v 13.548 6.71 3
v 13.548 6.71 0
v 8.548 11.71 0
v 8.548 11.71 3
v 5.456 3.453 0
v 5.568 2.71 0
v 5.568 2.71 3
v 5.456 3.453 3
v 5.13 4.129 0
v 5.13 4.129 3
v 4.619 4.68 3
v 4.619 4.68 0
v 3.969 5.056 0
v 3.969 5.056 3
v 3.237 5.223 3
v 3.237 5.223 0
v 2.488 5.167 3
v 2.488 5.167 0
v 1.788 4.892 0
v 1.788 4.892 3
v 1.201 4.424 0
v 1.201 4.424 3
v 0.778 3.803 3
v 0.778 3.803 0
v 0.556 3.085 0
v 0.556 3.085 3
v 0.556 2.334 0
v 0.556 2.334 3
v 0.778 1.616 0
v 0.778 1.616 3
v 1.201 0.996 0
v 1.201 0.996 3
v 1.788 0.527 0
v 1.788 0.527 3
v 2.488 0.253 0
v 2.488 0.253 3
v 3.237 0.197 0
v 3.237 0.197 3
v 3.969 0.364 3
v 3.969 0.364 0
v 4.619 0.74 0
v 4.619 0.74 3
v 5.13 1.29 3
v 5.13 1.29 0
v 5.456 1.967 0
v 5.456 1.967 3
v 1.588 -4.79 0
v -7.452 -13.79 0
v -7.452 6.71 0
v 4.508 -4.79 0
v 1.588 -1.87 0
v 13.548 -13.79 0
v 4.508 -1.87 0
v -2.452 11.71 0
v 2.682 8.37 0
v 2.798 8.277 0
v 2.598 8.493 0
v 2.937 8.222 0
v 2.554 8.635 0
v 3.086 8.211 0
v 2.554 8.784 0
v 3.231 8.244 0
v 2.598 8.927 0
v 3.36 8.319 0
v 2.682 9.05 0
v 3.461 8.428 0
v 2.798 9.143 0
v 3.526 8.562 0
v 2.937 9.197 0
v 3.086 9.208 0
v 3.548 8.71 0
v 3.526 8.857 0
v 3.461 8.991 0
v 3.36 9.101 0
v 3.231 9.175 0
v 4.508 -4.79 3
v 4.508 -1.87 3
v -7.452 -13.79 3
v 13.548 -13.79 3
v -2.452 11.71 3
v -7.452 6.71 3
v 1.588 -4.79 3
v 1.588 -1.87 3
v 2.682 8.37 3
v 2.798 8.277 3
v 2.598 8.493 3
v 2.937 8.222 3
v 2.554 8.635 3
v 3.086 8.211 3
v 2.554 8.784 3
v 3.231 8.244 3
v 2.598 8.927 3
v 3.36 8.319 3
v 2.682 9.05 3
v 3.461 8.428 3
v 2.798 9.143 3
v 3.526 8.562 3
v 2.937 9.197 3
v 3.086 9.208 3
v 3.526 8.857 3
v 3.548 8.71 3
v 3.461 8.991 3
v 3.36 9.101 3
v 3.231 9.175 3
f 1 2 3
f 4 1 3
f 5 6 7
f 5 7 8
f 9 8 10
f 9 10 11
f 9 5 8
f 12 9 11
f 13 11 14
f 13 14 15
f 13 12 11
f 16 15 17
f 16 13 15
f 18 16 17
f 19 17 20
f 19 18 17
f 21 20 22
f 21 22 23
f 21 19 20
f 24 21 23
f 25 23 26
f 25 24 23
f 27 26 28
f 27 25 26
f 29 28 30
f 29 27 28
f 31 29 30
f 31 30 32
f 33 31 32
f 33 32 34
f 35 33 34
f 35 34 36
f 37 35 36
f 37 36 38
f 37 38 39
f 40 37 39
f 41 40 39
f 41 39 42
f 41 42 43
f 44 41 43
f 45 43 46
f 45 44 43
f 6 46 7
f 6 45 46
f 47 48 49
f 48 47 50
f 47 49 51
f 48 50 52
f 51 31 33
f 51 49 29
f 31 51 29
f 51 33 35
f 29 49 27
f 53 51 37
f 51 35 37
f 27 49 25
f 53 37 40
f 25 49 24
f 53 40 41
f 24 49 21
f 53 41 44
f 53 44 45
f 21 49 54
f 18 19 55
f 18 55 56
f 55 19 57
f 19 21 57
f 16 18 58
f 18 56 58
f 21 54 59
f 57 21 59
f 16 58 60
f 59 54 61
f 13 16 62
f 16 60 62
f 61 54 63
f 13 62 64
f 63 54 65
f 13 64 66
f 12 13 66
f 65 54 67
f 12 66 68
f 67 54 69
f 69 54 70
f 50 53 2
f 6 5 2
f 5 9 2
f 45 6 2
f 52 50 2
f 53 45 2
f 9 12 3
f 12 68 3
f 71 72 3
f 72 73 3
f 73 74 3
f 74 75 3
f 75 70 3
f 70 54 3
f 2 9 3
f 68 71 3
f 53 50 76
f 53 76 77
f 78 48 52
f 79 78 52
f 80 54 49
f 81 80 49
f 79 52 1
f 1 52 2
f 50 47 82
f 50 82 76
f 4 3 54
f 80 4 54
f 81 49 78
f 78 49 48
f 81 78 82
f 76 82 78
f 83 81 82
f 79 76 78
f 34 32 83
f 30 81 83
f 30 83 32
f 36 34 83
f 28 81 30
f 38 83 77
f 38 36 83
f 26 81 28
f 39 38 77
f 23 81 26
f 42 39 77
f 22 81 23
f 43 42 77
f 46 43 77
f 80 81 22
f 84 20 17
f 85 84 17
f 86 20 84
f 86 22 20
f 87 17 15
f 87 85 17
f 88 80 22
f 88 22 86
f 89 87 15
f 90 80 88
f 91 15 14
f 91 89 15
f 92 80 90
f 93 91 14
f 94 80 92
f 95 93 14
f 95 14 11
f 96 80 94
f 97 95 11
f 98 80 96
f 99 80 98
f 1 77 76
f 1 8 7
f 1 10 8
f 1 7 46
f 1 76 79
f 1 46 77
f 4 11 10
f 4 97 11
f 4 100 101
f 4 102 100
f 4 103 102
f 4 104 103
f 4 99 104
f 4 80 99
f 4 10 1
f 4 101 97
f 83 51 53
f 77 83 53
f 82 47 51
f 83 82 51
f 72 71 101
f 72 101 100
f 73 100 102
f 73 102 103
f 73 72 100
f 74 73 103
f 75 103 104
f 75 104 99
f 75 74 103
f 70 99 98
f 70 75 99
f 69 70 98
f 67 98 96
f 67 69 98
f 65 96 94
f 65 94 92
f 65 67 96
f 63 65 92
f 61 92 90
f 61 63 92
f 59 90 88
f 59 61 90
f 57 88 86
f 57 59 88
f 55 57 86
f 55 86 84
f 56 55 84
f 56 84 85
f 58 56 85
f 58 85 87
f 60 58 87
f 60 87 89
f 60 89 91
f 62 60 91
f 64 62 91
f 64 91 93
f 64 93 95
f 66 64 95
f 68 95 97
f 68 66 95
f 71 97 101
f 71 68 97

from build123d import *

# Parameters (mm, degrees)
SKETCH1_W           = 2.92
SKETCH1_H           = 2.92
SKETCH1_R           = 2.52
SKETCH1_R_2         = 0.5
BOSS_EXTRUDE1_DEPTH = 3


with BuildPart() as part:
    # Sketch1 → Boss-Extrude1 (new body)
    with BuildSketch(Plane.XY):
        Polygon((13.5482559, 6.709731544), (8.5482559, 11.709731544), (-2.4517441, 11.709731544), (-7.4517441, 6.709731544), (-7.4517441, -13.790268456), (13.5482559, -13.790268456), align=None)
        with Locations((3.0482559, -3.330268456)):
            Rectangle(SKETCH1_W, SKETCH1_H, mode=Mode.SUBTRACT)
        with Locations((3.0482559, 2.709731544)):
            Circle(SKETCH1_R, mode=Mode.SUBTRACT)
        with Locations((3.0482559, 8.709731544)):
            Circle(SKETCH1_R_2, mode=Mode.SUBTRACT)
    extrude(amount=BOSS_EXTRUDE1_DEPTH)


solid = part.part
